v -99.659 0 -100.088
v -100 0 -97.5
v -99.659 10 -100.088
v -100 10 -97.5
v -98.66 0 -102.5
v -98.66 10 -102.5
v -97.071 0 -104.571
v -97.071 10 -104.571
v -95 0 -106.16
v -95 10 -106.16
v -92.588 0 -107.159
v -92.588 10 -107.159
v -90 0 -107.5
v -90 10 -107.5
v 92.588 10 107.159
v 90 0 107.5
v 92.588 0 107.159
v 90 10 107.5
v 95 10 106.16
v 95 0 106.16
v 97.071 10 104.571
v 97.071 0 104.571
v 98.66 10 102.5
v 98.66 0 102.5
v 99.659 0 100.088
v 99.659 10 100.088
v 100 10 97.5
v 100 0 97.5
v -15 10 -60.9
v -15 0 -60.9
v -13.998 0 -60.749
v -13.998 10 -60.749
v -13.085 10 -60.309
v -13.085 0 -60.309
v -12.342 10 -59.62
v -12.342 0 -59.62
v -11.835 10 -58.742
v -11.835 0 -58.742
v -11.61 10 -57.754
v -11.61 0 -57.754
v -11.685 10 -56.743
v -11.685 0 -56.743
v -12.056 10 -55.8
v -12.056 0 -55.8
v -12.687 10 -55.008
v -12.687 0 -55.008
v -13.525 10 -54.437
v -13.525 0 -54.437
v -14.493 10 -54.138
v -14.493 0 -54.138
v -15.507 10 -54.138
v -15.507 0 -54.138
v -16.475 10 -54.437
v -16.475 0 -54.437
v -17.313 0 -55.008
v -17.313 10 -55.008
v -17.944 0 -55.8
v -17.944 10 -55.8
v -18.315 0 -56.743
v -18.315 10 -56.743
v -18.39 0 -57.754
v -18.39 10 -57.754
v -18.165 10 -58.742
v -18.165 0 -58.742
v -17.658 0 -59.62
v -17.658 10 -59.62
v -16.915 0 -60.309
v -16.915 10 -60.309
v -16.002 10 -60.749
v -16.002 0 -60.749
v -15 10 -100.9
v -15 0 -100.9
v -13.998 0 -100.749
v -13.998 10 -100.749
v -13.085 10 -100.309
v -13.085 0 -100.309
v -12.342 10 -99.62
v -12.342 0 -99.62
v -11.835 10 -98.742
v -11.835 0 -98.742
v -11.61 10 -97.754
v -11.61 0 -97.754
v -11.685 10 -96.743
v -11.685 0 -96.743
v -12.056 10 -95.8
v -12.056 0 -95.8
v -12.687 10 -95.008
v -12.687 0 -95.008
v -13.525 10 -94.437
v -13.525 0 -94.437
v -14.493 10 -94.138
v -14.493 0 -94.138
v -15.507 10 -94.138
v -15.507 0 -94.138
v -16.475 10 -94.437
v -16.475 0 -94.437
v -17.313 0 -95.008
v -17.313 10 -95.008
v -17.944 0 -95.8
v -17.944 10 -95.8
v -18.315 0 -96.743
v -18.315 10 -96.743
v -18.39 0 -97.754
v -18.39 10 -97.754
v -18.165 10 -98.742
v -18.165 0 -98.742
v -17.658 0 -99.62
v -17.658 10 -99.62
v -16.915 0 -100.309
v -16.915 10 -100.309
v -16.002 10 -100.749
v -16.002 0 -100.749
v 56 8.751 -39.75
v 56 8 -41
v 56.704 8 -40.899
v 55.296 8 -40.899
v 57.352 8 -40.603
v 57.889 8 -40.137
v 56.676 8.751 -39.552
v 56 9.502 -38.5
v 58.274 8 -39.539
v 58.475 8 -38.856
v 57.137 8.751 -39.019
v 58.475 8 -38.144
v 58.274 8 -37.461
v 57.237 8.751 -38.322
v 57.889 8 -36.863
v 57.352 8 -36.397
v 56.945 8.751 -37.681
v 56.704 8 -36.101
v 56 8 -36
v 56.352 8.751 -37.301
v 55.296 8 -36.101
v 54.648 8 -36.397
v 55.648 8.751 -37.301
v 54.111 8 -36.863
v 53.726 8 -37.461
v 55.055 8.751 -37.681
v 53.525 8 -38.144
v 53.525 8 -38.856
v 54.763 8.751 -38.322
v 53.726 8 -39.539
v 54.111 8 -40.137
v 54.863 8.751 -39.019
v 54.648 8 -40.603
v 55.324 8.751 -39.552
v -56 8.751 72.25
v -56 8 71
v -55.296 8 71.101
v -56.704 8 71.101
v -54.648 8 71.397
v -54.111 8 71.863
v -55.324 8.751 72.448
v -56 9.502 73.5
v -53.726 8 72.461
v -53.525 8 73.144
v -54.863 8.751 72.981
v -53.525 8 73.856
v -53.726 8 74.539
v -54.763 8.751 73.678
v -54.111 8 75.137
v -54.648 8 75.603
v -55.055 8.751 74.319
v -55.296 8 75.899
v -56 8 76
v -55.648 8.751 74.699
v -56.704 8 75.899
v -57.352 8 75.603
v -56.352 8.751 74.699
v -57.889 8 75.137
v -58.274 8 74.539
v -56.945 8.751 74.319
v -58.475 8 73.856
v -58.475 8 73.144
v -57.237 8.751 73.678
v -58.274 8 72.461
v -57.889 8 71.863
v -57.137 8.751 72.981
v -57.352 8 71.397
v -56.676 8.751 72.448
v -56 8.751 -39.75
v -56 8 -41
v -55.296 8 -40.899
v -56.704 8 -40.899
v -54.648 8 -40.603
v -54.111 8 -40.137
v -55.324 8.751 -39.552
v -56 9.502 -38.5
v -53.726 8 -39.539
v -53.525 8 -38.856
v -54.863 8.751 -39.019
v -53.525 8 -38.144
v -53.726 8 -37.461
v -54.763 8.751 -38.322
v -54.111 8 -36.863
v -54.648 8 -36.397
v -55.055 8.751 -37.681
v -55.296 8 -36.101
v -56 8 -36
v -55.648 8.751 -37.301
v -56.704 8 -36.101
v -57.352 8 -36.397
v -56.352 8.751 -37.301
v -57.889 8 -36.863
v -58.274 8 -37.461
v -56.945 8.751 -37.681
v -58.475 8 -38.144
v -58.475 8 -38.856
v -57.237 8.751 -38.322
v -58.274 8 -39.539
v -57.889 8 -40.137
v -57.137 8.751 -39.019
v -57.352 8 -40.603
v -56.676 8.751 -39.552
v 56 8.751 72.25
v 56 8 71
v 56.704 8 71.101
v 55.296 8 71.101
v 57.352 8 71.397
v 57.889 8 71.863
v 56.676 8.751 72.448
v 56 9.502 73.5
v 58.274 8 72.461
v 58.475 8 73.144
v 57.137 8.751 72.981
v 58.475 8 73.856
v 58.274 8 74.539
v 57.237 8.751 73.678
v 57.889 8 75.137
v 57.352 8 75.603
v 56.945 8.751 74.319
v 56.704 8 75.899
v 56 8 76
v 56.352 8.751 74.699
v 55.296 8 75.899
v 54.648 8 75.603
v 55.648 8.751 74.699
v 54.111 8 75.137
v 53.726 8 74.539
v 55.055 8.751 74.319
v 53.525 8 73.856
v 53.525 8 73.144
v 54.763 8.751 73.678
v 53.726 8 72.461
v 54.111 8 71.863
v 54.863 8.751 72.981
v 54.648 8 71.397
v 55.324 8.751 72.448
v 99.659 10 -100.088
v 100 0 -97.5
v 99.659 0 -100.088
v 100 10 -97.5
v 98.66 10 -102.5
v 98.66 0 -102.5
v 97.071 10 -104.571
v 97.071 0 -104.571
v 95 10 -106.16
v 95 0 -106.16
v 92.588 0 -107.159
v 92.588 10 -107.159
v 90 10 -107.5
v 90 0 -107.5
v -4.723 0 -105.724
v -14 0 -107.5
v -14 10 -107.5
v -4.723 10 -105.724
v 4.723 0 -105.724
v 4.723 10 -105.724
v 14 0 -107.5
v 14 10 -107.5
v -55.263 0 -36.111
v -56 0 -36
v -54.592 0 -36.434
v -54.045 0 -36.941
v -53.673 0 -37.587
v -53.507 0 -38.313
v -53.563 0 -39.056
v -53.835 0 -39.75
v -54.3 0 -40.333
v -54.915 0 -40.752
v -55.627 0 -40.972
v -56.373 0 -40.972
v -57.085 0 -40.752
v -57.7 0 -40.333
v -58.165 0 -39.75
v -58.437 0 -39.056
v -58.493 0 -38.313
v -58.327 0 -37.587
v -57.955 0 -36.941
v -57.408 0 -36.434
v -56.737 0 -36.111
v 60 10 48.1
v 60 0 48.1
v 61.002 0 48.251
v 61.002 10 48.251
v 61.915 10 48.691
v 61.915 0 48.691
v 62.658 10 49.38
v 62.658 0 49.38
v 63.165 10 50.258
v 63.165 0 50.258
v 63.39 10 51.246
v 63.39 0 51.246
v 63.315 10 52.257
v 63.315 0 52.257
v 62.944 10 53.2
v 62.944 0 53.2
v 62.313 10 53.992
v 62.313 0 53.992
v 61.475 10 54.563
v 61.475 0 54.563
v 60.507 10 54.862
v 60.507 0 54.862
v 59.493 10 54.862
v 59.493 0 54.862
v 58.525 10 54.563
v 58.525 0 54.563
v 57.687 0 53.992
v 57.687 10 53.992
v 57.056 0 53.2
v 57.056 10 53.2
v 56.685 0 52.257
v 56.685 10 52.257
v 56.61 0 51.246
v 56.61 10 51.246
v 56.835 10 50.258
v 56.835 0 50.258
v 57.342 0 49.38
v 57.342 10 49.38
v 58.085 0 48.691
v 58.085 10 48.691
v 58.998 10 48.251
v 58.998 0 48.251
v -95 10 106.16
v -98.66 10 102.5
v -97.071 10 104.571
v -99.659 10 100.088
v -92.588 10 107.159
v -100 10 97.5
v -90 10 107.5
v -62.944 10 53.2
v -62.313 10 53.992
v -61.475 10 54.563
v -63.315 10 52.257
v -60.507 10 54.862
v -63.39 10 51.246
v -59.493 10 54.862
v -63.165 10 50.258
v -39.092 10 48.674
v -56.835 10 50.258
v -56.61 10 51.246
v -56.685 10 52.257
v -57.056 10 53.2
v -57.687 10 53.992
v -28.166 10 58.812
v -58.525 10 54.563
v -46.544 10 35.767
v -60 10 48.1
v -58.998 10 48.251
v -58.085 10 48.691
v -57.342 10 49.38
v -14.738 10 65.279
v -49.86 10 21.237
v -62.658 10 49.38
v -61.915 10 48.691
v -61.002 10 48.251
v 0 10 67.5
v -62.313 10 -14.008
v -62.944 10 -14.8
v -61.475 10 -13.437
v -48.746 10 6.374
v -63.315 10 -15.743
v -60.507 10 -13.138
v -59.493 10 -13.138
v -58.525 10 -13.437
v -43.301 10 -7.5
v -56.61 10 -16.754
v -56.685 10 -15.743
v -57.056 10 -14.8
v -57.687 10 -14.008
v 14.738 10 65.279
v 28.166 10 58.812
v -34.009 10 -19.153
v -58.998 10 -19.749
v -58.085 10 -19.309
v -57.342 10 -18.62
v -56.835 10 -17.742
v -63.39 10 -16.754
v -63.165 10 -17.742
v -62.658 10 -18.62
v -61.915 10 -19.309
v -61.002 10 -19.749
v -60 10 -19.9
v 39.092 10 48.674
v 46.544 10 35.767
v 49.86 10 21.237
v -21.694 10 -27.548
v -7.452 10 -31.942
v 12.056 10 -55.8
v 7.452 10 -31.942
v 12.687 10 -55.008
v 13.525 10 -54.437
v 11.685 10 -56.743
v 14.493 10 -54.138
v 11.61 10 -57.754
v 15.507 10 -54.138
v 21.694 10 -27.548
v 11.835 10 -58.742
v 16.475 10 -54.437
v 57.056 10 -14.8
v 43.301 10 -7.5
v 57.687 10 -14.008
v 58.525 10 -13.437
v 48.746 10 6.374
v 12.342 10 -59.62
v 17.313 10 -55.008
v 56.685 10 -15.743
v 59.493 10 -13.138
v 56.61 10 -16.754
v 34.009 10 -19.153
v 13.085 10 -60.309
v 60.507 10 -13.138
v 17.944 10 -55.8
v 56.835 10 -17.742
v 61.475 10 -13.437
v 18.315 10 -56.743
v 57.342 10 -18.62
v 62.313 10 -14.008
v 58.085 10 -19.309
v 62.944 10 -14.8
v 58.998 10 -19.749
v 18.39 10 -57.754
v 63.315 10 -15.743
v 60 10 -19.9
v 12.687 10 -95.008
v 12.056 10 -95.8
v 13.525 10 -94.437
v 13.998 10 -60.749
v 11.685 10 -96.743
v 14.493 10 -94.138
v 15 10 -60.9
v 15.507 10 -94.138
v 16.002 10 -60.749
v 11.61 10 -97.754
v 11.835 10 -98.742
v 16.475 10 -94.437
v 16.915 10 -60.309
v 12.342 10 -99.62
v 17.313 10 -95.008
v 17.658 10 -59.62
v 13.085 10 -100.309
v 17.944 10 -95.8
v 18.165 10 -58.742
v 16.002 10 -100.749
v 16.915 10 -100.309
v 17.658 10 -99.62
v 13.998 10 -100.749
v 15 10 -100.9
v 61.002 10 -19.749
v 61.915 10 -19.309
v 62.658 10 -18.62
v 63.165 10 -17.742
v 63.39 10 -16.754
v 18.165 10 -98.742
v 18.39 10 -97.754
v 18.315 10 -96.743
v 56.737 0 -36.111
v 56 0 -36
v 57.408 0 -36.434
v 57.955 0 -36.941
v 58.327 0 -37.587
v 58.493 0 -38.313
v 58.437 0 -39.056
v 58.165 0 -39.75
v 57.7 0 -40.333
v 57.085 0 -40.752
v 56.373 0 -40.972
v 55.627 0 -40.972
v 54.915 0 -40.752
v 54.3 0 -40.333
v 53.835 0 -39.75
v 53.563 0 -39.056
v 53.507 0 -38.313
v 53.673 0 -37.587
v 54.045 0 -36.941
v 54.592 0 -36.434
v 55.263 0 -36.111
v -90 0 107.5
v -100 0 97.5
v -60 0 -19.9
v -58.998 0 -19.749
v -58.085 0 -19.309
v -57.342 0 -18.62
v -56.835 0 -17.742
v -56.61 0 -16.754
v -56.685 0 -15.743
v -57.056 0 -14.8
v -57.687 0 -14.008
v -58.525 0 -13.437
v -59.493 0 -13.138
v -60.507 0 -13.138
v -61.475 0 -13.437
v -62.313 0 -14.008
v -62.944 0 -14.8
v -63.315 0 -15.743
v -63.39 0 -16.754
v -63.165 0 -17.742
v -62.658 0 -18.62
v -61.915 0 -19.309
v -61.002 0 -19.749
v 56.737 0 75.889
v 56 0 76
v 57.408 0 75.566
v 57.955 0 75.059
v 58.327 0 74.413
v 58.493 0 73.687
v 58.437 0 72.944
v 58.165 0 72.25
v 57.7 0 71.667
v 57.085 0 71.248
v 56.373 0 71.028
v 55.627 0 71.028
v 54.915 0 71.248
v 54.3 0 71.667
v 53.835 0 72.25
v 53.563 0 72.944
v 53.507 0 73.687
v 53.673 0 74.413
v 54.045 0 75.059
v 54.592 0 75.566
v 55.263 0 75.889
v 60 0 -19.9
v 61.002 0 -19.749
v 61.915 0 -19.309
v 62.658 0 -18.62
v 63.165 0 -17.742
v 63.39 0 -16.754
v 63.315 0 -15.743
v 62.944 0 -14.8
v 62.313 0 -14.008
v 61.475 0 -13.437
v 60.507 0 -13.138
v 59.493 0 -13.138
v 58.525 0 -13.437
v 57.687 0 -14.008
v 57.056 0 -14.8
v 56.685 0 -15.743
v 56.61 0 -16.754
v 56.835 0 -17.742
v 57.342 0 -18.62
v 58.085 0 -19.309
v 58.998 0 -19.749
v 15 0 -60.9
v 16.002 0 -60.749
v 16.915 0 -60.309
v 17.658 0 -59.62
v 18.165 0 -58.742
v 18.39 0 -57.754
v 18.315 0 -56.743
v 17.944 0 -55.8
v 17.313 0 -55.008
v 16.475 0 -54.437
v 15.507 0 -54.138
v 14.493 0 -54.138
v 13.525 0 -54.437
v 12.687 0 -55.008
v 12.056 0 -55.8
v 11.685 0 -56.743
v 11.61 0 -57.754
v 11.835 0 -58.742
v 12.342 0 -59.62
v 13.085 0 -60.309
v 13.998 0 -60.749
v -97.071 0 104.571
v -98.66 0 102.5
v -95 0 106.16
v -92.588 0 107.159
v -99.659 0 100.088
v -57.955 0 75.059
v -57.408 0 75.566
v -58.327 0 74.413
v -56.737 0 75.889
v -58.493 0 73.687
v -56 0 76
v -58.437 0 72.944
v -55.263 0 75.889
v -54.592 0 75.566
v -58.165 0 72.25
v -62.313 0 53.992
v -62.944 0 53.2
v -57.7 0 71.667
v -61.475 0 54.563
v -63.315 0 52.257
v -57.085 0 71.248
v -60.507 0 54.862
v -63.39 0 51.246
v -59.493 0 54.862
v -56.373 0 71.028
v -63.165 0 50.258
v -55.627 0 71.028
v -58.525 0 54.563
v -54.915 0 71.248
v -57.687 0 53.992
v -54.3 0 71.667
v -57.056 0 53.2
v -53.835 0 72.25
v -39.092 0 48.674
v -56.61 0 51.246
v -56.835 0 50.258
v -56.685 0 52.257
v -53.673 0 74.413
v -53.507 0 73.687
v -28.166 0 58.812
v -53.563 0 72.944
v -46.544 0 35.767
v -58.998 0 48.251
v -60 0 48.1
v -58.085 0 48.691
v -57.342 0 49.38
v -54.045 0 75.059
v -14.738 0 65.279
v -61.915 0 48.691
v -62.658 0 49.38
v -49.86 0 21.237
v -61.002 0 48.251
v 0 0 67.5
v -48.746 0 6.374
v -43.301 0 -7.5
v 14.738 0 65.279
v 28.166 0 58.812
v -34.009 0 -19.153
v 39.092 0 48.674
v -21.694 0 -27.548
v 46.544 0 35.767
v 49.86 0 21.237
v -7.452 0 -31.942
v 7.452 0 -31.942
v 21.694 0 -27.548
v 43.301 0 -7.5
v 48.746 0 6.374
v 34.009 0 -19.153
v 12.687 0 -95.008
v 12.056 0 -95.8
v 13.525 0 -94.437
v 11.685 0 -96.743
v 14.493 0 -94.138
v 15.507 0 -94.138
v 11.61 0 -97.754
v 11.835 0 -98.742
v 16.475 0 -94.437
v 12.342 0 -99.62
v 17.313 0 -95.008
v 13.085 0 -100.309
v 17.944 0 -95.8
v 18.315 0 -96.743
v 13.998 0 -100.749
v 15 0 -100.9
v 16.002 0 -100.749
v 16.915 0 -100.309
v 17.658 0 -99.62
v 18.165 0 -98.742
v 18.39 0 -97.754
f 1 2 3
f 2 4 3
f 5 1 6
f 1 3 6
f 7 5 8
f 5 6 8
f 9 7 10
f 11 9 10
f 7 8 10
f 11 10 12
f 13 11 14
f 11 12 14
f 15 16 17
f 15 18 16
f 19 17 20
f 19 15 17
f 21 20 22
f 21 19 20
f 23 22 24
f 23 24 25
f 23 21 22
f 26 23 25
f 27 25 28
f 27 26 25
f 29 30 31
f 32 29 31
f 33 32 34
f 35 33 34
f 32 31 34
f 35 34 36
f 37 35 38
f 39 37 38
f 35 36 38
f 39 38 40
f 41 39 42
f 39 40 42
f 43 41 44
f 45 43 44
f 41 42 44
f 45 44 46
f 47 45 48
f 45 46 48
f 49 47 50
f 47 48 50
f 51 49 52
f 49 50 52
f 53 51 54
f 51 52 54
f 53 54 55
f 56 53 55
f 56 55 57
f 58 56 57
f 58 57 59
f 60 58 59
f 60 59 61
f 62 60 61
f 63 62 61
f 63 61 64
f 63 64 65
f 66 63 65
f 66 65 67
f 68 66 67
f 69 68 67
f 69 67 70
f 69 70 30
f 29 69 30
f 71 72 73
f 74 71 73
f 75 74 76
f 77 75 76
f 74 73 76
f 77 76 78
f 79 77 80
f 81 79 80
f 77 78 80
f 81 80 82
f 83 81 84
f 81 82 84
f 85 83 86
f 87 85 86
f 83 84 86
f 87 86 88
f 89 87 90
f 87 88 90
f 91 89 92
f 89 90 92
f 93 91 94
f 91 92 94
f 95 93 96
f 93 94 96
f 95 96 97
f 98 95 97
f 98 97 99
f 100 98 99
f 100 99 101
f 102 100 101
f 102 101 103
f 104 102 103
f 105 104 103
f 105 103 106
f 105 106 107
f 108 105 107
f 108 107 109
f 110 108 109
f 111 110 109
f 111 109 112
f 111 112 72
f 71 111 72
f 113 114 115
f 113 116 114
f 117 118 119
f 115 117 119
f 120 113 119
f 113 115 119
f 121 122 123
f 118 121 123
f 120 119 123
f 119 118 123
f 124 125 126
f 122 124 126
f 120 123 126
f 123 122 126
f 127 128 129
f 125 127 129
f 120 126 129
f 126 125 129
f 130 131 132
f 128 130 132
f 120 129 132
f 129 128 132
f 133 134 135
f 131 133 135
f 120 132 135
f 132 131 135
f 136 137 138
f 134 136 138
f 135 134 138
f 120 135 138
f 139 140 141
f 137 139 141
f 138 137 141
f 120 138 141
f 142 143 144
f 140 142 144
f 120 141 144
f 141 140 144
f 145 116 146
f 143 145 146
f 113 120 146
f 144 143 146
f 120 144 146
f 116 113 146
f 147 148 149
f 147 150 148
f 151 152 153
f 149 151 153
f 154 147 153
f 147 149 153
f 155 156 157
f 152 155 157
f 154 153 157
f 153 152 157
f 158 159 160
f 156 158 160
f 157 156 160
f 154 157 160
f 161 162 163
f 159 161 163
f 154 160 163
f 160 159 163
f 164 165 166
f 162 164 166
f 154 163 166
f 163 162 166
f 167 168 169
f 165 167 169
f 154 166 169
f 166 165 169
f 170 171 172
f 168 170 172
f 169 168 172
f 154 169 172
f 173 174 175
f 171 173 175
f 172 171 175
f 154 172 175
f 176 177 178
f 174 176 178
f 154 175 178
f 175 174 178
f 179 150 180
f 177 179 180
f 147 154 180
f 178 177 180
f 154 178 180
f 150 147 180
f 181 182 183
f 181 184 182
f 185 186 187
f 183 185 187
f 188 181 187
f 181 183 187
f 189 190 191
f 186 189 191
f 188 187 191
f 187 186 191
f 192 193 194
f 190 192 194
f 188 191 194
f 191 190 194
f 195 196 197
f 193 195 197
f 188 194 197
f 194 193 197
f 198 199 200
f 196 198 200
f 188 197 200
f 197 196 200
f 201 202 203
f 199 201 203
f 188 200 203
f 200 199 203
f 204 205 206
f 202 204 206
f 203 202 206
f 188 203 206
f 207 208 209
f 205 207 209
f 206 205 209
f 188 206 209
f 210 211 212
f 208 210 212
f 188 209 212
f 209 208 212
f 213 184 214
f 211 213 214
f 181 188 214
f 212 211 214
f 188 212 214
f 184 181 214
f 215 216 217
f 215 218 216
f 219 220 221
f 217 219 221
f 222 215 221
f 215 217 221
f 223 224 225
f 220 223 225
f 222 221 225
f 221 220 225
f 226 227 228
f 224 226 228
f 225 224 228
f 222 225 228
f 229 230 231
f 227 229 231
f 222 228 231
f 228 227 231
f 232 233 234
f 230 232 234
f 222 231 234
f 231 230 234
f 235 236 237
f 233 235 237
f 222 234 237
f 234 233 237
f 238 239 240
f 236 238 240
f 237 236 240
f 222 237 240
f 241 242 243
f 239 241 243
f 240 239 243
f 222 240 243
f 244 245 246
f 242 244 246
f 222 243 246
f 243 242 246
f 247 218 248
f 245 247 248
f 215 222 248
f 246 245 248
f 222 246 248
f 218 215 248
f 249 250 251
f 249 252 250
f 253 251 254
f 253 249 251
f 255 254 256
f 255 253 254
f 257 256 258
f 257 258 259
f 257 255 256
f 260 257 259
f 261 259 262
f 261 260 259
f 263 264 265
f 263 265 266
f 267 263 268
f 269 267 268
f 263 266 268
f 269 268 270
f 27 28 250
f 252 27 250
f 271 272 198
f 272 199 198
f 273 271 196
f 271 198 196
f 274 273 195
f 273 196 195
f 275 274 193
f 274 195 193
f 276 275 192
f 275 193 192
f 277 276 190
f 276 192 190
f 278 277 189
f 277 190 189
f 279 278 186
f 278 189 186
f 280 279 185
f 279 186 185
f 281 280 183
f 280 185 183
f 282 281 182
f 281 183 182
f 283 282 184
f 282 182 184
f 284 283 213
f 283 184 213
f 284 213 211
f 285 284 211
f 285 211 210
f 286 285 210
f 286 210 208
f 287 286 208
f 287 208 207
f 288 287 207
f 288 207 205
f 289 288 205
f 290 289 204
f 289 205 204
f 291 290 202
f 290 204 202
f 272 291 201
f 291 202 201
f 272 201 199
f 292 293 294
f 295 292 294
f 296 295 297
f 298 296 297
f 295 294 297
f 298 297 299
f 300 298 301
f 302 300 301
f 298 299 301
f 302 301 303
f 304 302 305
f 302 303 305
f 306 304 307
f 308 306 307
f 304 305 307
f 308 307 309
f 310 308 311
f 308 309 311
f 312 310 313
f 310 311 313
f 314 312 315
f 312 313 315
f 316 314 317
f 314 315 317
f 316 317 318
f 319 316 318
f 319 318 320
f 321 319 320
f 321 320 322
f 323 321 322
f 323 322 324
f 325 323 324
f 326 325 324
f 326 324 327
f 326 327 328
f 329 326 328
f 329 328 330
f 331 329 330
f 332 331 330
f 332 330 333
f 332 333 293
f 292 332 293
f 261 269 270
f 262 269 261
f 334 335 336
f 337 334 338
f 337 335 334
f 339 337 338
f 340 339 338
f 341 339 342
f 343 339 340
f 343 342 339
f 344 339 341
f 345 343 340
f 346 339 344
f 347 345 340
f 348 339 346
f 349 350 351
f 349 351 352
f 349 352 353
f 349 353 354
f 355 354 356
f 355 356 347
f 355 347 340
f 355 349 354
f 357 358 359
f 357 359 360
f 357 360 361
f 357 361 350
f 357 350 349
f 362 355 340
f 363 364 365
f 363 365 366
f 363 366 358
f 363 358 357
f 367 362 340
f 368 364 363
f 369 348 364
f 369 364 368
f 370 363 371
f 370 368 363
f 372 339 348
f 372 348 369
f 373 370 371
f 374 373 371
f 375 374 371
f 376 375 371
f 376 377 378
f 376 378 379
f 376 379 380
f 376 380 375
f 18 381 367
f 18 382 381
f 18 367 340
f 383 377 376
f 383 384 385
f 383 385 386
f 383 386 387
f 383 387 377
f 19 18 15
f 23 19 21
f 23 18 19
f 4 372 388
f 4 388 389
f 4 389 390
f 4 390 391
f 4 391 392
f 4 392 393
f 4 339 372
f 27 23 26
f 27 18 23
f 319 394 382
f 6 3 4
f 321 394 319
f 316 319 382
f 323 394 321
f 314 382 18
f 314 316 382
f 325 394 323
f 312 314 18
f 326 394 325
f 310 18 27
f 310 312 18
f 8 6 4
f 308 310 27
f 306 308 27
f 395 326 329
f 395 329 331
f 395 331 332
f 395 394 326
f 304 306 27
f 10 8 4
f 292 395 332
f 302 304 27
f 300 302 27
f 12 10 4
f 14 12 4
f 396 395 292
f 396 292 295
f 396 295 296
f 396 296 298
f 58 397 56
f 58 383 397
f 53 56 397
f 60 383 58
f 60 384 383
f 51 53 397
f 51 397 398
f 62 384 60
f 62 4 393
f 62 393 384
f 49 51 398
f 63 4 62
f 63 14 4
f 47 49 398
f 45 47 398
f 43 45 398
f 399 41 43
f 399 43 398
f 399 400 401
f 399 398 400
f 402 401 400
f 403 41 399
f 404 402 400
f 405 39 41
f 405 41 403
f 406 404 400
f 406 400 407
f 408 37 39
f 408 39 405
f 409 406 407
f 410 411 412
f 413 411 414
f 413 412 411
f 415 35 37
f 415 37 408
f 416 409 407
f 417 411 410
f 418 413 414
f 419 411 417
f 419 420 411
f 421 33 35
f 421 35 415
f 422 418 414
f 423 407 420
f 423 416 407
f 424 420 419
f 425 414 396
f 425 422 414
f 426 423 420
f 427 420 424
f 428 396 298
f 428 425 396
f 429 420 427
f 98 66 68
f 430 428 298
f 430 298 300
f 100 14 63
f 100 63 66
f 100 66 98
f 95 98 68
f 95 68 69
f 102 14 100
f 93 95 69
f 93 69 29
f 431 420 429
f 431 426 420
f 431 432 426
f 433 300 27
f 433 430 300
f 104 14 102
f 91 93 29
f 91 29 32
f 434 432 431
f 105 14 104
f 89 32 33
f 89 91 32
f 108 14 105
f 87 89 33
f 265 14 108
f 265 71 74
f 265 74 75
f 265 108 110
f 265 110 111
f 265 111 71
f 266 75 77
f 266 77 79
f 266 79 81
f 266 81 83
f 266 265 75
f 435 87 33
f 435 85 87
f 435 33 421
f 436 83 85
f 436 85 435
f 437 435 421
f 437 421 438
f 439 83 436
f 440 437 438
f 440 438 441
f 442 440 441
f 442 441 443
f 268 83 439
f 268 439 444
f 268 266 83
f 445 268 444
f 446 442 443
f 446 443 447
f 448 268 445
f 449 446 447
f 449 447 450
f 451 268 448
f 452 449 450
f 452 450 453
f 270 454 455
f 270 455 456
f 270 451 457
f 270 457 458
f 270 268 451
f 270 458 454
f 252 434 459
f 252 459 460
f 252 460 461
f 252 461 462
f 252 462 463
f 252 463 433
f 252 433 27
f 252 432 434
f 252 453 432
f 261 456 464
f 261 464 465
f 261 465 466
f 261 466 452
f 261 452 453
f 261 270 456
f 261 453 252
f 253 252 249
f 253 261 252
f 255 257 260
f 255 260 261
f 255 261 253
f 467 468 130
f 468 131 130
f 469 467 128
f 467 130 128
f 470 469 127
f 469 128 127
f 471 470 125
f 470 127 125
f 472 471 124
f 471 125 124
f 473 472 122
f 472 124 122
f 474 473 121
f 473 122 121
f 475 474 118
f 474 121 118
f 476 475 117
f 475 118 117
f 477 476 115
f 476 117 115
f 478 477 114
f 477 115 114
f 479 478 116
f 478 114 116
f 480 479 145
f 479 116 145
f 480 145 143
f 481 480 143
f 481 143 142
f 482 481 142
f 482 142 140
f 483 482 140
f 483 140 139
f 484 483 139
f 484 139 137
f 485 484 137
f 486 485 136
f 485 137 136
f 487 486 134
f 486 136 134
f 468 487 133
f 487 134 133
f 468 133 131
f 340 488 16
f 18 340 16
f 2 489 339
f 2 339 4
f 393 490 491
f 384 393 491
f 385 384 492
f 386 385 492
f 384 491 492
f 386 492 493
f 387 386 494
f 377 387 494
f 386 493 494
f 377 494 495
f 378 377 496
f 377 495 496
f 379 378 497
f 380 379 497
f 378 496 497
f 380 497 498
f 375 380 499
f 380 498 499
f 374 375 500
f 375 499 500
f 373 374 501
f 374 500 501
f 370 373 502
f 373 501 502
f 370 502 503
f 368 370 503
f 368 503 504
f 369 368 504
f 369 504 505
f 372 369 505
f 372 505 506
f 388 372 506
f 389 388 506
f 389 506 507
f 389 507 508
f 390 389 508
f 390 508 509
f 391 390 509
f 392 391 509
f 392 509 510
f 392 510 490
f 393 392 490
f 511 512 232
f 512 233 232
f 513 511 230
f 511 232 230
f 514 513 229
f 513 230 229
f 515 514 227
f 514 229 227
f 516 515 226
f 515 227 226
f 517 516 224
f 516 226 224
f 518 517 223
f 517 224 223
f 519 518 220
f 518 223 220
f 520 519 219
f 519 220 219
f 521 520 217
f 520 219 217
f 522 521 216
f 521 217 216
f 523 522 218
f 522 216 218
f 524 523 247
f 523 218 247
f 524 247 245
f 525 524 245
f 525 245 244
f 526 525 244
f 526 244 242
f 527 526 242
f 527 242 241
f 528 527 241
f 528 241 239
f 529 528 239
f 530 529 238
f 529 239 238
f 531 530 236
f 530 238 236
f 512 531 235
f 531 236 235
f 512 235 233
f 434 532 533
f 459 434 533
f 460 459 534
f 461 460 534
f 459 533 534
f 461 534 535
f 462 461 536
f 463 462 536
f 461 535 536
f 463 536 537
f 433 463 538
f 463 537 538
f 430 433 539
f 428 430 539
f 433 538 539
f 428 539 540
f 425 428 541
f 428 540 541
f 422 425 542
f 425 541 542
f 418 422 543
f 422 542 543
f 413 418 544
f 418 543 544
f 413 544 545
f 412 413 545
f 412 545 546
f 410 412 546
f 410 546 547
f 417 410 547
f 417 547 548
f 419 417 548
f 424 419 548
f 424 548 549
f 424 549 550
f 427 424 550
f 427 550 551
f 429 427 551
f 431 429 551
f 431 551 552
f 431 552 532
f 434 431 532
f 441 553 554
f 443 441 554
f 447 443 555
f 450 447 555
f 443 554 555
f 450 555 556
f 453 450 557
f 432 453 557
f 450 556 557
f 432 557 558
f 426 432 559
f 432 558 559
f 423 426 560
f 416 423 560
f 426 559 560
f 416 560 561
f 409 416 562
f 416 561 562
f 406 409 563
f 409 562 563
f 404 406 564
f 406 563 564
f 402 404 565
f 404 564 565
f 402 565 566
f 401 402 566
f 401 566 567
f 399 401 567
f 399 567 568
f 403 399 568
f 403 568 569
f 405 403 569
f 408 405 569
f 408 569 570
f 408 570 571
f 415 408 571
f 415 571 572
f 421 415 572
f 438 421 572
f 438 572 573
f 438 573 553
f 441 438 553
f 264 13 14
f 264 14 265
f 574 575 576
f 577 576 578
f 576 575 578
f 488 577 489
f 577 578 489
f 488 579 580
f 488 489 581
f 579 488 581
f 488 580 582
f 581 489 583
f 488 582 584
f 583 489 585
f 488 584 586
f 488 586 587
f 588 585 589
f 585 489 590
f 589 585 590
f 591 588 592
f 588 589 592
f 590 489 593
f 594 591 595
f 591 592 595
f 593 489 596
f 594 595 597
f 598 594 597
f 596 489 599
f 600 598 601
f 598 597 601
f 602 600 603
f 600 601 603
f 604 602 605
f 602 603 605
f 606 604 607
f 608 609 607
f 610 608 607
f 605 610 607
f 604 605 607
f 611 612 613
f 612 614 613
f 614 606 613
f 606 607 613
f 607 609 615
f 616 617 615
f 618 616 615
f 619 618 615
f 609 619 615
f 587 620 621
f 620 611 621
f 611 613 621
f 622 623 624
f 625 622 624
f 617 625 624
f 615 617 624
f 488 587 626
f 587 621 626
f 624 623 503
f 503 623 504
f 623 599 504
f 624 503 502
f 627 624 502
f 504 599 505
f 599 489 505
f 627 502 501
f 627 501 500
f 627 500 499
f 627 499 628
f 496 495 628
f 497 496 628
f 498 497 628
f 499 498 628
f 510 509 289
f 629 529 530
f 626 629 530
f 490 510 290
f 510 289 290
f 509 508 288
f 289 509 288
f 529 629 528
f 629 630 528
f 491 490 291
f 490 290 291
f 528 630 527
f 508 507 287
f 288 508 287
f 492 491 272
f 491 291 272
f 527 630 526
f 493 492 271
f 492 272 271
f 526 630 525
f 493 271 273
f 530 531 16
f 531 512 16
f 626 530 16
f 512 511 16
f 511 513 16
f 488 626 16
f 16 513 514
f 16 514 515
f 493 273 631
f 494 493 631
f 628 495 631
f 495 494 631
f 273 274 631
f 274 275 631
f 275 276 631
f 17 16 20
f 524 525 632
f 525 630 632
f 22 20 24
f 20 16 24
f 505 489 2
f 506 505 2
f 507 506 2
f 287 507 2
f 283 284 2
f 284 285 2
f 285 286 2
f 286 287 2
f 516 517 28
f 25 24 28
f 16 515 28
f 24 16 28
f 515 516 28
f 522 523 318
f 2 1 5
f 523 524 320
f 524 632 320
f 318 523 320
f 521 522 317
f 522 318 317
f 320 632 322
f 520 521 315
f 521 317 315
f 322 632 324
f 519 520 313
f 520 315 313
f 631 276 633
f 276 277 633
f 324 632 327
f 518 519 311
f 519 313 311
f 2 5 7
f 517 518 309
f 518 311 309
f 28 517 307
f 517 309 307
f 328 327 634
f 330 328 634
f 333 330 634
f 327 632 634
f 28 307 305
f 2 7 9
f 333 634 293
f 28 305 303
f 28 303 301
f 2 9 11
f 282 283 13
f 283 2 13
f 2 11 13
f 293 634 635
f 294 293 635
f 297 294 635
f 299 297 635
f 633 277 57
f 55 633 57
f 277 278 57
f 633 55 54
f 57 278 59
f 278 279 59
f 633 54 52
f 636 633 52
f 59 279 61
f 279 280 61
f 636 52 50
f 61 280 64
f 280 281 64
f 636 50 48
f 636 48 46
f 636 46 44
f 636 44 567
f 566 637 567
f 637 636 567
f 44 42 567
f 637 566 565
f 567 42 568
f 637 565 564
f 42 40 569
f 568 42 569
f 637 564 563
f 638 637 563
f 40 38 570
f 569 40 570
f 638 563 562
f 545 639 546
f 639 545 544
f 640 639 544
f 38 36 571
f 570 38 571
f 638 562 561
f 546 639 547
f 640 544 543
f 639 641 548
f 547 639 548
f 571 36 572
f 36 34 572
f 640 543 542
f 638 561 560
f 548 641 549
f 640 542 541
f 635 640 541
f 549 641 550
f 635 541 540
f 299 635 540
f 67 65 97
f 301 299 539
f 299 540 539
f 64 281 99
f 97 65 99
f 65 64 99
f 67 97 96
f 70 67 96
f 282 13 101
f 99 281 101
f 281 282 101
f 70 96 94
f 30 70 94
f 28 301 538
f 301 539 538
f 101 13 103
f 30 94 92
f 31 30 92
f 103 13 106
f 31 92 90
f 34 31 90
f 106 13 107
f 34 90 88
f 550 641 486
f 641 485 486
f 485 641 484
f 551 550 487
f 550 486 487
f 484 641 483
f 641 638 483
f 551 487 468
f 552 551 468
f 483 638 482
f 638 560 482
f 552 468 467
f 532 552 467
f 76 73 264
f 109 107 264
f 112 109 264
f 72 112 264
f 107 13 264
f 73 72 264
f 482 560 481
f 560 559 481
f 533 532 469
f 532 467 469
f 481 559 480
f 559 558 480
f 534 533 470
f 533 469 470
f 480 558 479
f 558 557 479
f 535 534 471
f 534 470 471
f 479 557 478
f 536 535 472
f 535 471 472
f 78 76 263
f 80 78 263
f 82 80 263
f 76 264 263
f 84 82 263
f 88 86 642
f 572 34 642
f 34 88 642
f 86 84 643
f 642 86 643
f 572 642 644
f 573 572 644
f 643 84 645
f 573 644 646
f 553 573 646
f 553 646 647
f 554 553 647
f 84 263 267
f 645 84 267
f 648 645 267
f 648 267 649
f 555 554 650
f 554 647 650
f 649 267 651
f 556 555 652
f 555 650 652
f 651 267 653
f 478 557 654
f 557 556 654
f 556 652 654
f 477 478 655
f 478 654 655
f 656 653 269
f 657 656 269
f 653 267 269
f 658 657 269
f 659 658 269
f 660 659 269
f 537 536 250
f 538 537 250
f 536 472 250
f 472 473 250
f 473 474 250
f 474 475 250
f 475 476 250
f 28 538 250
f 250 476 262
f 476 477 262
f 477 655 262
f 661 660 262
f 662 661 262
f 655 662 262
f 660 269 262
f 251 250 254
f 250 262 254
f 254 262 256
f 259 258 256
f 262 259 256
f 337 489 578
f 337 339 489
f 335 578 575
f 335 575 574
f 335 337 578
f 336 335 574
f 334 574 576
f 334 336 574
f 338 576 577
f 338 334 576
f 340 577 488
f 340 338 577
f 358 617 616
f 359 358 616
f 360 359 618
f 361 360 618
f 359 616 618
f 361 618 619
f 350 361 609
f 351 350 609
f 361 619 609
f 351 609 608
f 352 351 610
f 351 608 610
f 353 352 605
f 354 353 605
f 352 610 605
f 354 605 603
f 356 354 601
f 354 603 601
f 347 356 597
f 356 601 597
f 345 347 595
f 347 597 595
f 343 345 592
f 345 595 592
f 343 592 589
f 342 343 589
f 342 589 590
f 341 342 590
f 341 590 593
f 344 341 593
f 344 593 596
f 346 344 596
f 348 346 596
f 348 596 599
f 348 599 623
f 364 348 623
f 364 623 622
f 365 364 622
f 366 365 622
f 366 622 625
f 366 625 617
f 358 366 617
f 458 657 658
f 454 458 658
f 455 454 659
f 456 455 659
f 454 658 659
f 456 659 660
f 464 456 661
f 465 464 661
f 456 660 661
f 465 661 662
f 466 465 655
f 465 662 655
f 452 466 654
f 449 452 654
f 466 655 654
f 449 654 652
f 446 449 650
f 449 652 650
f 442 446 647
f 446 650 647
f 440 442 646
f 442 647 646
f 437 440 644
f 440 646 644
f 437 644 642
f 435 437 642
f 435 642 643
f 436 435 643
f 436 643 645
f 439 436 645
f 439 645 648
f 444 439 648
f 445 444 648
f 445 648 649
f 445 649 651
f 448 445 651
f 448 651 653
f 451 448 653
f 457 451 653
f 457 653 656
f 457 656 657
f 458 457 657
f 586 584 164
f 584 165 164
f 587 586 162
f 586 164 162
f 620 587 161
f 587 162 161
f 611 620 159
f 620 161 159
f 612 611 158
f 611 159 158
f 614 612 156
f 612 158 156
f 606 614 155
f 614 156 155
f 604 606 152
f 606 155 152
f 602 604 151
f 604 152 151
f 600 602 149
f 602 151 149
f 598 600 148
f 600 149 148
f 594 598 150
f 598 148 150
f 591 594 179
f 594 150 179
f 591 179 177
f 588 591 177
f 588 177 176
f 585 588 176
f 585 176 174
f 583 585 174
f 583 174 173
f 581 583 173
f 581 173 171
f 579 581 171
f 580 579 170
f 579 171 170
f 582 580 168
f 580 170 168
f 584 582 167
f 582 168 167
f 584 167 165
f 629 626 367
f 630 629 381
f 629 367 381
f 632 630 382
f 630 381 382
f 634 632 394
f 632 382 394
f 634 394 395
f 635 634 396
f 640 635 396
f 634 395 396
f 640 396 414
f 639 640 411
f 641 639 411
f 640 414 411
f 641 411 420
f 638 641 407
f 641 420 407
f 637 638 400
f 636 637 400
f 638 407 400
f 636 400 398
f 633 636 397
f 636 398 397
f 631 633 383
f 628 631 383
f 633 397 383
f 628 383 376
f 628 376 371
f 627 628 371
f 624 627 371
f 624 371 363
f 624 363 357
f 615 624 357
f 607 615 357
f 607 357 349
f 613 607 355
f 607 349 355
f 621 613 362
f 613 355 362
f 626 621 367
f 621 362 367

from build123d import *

# Parameters (mm, degrees)
SKETCH1_W             = 200
SKETCH1_H             = 215
EXTRUDE1_DEPTH        = 10
M8_TAPPED_HOLE1_D     = 6.8
M8_TAPPED_HOLE1_DEPTH = 19.75
M8_TAPPED_HOLE1_TIP   = 2.042926105
M8_TAPPED_HOLE2_D     = 6.8
M8_TAPPED_HOLE2_DEPTH = 19.75
M8_TAPPED_HOLE2_TIP   = 2.042926105
SKETCH5_R             = 50
EXTRUDE2_DEPTH        = 10
SKETCH6_R             = 50
EXTRUDE3_DEPTH        = 10
FILLET1_R             = 10
M6_TAPPED_HOLE1_D     = 5
M6_TAPPED_HOLE1_DEPTH = 8
M6_TAPPED_HOLE1_TIP   = 1.502151548


with BuildPart() as part:
    # Sketch1 → Extrude1 (new body)
    with BuildSketch(Plane(origin=(0, 0, 0), x_dir=(1, 0, 0), z_dir=(0, 1, 0))):
        Rectangle(SKETCH1_W, SKETCH1_H)
    extrude(amount=EXTRUDE1_DEPTH)

    # M8 Tapped Hole1
    with Locations(Plane(origin=(-60, 10, -16.5), x_dir=(0, 0, 1), z_dir=(0, 1, 0))):
        with Locations((0, 0), (0, 120), (68, 0), (68, 120)):
            Hole(M8_TAPPED_HOLE1_D / 2, depth=M8_TAPPED_HOLE1_DEPTH)
            with Locations((0, 0, -(M8_TAPPED_HOLE1_DEPTH + M8_TAPPED_HOLE1_TIP / 2))):  # 118° drill point
                Cone(0, M8_TAPPED_HOLE1_D / 2, M8_TAPPED_HOLE1_TIP, mode=Mode.SUBTRACT)

    # M8 Tapped Hole2
    with Locations(Plane(origin=(-15, 10, -97.5), x_dir=(0, 0, 1), z_dir=(0, 1, 0))):
        with Locations((0, 0), (40, 0), (40, 30), (0, 30)):
            Hole(M8_TAPPED_HOLE2_D / 2, depth=M8_TAPPED_HOLE2_DEPTH)
            with Locations((0, 0, -(M8_TAPPED_HOLE2_DEPTH + M8_TAPPED_HOLE2_TIP / 2))):  # 118° drill point
                Cone(0, M8_TAPPED_HOLE2_D / 2, M8_TAPPED_HOLE2_TIP, mode=Mode.SUBTRACT)

    # Sketch5 → Extrude2 (cut)
    with BuildSketch(Plane(origin=(0, 10, 0), x_dir=(1, 0, 0), z_dir=(0, 1, 0))):
        with Locations(Location((0, -17.5, 0), (0, 0, 270))):
            Circle(SKETCH5_R)
    extrude(amount=-EXTRUDE2_DEPTH, mode=Mode.SUBTRACT)

    # Sketch6 → Extrude3 (cut)
    with BuildSketch(Plane(origin=(0, 10, 0), x_dir=(1, 0, 0), z_dir=(0, 1, 0))):
        with Locations((0, 155.5)):
            Circle(SKETCH6_R)
    extrude(amount=-EXTRUDE3_DEPTH, mode=Mode.SUBTRACT)

    # Fillet1
    fillet1_edges = [part.edges().sort_by_distance(p)[0] for p in [
        (-100, 5, -107.5),
        (100, 5, -107.5),
        (100, 5, 107.5),
        (-100, 5, 107.5),
    ]]
    fillet(fillet1_edges, radius=FILLET1_R)

    # M6 Tapped Hole1
    with Locations(Plane(origin=(-56, 0, -38.5), x_dir=(0, 0, -1), z_dir=(0, -1, 0))):
        with Locations((0, 0), (0, 112), (-112, 0), (-112, 112)):
            Hole(M6_TAPPED_HOLE1_D / 2, depth=M6_TAPPED_HOLE1_DEPTH)
            with Locations((0, 0, -(M6_TAPPED_HOLE1_DEPTH + M6_TAPPED_HOLE1_TIP / 2))):  # 118° drill point
                Cone(0, M6_TAPPED_HOLE1_D / 2, M6_TAPPED_HOLE1_TIP, mode=Mode.SUBTRACT)


solid = part.part
